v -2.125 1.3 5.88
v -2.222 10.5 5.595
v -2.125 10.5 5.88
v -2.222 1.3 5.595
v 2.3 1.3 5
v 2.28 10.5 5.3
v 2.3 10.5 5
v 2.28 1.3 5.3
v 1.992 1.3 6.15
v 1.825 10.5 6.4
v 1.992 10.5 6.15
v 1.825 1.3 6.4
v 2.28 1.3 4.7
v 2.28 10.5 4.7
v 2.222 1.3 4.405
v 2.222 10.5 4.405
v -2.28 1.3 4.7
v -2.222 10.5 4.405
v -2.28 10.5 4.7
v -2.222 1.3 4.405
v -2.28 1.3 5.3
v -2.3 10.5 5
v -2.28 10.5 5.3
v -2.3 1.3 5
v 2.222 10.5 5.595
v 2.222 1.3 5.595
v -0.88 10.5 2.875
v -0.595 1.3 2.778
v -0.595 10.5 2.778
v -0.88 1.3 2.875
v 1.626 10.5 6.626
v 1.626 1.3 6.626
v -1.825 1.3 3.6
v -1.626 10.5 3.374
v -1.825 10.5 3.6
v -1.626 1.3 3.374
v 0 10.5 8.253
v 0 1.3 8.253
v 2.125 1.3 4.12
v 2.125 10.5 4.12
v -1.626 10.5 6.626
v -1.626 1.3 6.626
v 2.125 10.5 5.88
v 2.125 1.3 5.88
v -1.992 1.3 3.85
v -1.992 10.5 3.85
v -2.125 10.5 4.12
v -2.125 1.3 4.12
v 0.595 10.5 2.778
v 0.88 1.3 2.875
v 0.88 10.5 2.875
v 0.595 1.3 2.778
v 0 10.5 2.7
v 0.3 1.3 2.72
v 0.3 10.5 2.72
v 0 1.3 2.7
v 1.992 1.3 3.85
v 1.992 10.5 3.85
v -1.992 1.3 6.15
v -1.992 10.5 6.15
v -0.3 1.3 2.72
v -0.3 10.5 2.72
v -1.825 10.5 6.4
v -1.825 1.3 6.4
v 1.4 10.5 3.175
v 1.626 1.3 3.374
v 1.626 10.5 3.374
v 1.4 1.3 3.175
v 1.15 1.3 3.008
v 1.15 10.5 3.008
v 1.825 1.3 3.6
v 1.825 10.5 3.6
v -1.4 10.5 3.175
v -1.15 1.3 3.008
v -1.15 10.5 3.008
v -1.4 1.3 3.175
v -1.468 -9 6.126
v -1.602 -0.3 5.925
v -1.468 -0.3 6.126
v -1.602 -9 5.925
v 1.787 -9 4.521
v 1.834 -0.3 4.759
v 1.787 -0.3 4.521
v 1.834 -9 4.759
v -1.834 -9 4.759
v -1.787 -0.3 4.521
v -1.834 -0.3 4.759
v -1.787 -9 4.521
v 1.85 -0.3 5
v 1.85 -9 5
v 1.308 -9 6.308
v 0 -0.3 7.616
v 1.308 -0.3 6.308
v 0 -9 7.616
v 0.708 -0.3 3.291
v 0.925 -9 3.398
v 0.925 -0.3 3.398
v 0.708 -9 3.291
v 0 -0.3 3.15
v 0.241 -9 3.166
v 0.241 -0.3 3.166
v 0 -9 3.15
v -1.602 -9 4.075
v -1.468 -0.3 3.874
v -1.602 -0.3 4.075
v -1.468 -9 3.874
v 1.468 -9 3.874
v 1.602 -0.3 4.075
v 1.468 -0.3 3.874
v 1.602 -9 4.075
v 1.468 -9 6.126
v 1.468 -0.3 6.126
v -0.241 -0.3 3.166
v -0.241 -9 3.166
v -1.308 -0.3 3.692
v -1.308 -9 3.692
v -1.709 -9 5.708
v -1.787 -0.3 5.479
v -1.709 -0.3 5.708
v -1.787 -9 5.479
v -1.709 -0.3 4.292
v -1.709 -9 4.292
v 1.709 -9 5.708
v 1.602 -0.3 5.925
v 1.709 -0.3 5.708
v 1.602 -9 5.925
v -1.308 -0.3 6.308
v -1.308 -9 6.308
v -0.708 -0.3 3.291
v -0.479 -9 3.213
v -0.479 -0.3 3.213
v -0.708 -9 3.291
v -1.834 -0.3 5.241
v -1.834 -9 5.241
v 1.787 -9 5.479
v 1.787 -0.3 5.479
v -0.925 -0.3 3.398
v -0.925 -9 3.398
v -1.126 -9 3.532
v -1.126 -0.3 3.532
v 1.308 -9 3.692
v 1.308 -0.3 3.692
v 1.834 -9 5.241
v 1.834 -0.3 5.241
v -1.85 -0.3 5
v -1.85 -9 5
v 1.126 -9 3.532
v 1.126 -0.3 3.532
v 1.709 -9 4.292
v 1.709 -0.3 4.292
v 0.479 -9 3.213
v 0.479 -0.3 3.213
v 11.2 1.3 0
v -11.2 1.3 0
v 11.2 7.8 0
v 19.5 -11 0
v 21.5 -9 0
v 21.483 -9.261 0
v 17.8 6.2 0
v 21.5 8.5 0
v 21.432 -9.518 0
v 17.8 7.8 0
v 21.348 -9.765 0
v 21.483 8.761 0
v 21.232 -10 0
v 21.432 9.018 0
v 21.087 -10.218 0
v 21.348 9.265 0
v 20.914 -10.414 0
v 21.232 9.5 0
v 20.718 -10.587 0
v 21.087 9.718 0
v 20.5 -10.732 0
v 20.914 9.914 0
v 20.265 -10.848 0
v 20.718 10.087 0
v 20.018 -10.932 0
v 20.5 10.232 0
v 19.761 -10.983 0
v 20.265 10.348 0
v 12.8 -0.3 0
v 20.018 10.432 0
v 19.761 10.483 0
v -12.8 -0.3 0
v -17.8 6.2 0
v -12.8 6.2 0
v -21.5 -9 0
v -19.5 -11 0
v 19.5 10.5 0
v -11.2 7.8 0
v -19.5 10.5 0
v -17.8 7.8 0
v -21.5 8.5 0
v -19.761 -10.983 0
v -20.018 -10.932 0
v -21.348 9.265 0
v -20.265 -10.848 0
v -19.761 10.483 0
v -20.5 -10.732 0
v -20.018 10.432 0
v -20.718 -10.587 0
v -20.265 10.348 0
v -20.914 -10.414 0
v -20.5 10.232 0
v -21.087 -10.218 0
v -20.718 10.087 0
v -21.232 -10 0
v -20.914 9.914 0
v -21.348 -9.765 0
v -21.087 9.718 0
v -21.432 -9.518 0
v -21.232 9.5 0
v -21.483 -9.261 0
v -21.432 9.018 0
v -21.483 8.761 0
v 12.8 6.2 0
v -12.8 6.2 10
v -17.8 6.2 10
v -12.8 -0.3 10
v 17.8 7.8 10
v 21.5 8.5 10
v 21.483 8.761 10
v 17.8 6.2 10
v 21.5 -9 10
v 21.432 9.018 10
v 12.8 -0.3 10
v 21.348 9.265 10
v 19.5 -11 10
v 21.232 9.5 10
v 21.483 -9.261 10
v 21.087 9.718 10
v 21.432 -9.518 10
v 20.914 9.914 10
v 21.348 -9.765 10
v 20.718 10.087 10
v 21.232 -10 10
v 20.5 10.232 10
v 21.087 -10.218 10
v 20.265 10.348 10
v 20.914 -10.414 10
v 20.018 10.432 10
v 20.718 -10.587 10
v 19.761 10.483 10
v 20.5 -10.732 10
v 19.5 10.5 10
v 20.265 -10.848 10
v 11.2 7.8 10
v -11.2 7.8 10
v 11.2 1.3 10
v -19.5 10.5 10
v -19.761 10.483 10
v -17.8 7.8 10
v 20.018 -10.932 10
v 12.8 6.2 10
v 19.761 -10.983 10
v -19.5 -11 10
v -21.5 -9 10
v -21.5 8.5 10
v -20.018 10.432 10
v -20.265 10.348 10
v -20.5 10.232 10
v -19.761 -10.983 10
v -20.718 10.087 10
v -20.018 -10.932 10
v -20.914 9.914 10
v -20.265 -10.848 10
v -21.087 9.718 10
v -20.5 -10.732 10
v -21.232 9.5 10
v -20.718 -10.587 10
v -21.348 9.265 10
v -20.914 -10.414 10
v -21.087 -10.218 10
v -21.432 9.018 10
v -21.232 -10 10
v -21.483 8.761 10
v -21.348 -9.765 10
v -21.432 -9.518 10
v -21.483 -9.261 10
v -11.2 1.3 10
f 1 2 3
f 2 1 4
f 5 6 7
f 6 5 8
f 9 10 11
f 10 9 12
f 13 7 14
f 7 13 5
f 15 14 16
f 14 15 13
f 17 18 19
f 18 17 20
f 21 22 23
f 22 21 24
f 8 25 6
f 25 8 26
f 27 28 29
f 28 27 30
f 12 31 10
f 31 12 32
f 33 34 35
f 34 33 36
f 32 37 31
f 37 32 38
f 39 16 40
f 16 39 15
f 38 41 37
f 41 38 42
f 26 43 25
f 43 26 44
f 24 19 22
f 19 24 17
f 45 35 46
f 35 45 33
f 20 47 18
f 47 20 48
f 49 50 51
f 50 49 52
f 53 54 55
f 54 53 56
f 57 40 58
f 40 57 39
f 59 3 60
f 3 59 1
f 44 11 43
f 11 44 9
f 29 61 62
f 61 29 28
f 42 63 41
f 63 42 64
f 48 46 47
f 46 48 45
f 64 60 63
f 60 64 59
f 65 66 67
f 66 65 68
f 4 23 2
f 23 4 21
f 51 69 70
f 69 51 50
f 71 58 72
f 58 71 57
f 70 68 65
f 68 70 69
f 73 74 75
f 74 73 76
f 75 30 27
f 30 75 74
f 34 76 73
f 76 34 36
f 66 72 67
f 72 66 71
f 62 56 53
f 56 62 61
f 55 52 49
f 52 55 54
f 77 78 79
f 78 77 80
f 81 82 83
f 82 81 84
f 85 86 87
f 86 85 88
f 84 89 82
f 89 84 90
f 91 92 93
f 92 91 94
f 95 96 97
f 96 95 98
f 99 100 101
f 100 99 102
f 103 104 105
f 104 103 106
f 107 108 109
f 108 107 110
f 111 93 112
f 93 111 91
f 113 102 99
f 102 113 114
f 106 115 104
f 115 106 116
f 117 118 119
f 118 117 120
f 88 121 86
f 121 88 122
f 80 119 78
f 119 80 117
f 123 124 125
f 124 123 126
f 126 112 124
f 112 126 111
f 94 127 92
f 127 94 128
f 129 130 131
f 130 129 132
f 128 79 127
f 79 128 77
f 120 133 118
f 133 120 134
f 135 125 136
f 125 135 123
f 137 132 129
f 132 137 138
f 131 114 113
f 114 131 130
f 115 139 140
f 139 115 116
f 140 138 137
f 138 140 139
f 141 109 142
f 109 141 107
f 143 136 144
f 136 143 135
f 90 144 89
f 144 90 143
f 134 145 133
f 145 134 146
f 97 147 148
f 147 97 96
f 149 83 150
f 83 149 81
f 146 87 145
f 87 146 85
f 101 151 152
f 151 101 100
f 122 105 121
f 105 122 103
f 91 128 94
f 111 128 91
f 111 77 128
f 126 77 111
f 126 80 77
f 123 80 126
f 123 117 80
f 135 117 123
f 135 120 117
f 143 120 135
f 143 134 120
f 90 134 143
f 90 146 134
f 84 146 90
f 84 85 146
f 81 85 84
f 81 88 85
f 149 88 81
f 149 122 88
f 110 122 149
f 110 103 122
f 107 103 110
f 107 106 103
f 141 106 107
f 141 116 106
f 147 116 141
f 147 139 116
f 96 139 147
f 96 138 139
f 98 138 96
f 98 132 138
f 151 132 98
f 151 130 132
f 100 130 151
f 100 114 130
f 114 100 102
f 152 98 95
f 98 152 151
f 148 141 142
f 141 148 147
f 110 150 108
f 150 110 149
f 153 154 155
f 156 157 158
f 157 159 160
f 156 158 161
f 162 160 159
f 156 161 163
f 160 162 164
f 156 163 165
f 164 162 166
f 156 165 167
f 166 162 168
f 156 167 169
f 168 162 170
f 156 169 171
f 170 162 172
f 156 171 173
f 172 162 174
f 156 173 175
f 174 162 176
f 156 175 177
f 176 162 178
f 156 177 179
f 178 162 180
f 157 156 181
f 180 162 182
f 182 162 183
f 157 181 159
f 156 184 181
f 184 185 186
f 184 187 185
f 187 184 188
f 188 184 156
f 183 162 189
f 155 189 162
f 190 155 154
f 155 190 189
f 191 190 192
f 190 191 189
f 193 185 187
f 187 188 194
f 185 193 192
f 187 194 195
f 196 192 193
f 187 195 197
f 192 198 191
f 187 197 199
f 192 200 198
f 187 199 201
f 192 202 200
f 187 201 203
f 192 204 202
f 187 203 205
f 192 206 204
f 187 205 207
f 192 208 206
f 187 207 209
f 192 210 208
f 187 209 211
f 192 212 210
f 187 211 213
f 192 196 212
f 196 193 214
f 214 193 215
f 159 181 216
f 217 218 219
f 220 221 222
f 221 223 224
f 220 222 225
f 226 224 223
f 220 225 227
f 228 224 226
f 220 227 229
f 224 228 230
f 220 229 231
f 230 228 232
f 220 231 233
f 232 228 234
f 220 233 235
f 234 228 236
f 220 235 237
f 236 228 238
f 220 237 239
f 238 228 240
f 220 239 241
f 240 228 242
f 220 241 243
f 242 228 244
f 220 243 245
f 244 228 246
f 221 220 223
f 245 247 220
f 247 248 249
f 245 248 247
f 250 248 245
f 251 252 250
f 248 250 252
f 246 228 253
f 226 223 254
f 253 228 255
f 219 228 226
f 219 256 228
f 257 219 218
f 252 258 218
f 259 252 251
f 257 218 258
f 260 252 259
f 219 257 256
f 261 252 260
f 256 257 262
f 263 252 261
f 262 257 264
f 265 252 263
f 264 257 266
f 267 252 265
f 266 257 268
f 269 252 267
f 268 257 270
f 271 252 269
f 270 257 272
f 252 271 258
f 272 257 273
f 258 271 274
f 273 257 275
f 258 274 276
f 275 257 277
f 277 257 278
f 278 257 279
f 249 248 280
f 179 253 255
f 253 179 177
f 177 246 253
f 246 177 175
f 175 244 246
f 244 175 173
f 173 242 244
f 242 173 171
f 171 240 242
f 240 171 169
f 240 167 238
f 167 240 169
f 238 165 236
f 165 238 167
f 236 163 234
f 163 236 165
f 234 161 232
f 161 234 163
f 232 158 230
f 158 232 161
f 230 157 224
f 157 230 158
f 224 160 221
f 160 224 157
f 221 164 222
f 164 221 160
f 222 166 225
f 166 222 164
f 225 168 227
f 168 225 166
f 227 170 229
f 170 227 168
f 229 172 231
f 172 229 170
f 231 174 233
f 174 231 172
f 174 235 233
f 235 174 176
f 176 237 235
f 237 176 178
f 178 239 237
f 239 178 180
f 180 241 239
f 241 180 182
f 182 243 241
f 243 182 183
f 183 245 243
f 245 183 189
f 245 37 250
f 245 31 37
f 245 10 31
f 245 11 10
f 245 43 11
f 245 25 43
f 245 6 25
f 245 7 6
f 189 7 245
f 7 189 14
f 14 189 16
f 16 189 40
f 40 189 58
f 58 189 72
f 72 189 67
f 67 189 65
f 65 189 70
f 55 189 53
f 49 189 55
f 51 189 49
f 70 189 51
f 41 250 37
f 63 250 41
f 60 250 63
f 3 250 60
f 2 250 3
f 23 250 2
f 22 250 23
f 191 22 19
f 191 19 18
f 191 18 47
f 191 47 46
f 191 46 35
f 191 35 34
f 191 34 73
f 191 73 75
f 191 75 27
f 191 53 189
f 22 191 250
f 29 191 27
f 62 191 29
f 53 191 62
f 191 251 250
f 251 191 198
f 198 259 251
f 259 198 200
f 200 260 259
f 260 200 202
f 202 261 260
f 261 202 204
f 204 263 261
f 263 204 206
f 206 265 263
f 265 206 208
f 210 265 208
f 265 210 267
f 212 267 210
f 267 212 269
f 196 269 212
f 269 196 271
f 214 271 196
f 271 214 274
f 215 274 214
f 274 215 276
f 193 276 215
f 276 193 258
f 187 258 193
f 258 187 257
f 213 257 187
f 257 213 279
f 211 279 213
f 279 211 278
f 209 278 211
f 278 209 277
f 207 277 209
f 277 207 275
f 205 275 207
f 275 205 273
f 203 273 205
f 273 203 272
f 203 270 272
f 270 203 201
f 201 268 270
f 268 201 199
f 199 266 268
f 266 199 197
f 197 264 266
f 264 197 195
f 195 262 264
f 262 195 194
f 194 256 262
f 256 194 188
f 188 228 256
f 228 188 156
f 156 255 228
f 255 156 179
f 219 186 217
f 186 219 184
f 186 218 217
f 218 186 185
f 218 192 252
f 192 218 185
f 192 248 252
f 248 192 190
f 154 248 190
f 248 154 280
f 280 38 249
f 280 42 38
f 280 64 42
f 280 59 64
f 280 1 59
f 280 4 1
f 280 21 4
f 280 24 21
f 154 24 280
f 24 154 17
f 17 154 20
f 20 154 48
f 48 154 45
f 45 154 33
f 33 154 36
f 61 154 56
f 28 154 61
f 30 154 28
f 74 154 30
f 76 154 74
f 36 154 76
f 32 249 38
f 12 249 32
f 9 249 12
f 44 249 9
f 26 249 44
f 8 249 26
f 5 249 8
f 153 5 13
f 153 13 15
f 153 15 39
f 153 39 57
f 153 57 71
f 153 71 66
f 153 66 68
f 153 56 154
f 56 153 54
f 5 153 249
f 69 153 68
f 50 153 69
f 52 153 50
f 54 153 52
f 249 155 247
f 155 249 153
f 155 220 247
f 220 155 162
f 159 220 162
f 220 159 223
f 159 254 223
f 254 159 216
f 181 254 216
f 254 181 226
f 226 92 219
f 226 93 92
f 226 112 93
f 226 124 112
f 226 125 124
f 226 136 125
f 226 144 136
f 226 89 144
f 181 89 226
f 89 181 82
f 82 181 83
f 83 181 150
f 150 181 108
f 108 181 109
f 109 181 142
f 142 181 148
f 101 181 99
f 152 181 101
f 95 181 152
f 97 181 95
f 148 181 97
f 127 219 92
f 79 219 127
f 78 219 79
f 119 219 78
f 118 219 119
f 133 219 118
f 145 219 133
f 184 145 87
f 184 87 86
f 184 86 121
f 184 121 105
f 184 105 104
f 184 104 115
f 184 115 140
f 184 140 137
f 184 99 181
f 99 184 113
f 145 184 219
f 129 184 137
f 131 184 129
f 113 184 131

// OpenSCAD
// file: model.scad
// DIN-rail bench stand: one end bracket of a pair, holding four TS35 rails.
// Two rails cross the sloped front face, one above the other; the third lies flat on the foot, in front of them;
// the fourth lies flat inside the frame at the back, under the face, for AC gear: a small PSU, terminals, relays.
//
// After Szmalu's "DIN Rail Stand KIT" (Thingiverse 3609072; nothing of its mesh is used): each rail passes through
// the bracket in a slot of its own cross-section, held between the slot's flat faces, and one M4 screw through
// the slot's cover and the rail's base pins it lengthwise. The plate is thick across the rail and the bars are
// ladders, two thin strips with a slot between, as the original's foot is.
//
// The profile is drawn in 2D with x toward the front of the desk and y up, then extruded bracket_t:
// print flat, as modelled; view="assembly" stands two brackets up with rails and module envelopes;
// view="gauge" is one rail block, thin, to check the slot and screw fit before the bracket prints.

/* [View] */
view = "part";            // "part" (print), "assembly" or "gauge"

/* [Frame] */
a = 60;                   // sloped face, degrees above the desk; modules lean back 90 - a
bar_w = 11;               // width of every bar in the profile
strip = 3;                // each of a ladder bar's two strips; the slot between is bar_w - 2 strip
rung_pitch = 70;          // a rung across the ladder slot at least this often
bracket_t = 20;           // thickness of the plate (print height), across the rail

/* [Rails] */
s1 = 70;                  // tier 1 rail centre, along the face from its foot
pitch = 125;              // tier 2 sits this far above tier 1, along the face
face_over = 15;           // face runs this far past the top module's envelope
flat_x = 280;             // flat rail centre, from the back of the stand
back_x = 60;              // back (AC) rail centre, from the back of the stand
face_shift = 35;          // face starts this far forward of the back post, to make room for the back rail

/* [Rail slot] TS35 passes through, held between the slot's faces */
rail_clr = 0.3;           // slot clearance each side of the 1 mm rail sheet; guess, gauge it
block_wall = 4;           // block beyond each rail lip
cover = 3;                // block over the rail's lips, outward

/* [Fixing] M4 x 16 screw through the cover, the rail's base slot, into a pilot below */
clear_d = 4.6;            // through the cover and the plastic in the rail's channel; guess
pilot_d = 3.7;            // guess; printed holes run small, gauge before trusting it
pilot_depth = 9;          // below the rail's base

/* [Module envelope, for the assembly view and the clearance test] */
mod_h = 90;               // DIN module height, across the rail (standard 90)
mod_d = 70;               // module depth out from the rail base (guess: PSU 55-60, meters ~65)
back_mod_d = 65;          // the back rail's modules: small PSU, terminals, relays (guess)
rail_len = 300;           // rail length in the assembly view

/* [Gauge] */
gauge_t = 10;             // gauge print height

/* [Hidden] */
$fn = 48;
e = 0.01;
u = [-cos(a), sin(a)];            // up the face
n = [sin(a), cos(a)];             // out of the face (toward the user)
face_len = s1 + pitch + mod_h / 2 + face_over;
foot0 = [bar_w / 2 + face_shift + face_len * cos(a), bar_w / 2];   // face centreline at its foot
top = foot0 + face_len * u;                           // joined back to the post by a top bar
foot_len = flat_x + mod_h / 2 + 10;
post_top = [bar_w / 2, top[1]];
post_foot = [bar_w / 2, bar_w / 2];
foot_end = [foot_len, bar_w / 2];

function edge(s) = foot0 + s * u + (bar_w / 2) * n;  // rail base on the face's outer edge

// rail seats: base point and outward direction
seats = [[edge(s1), n], [edge(s1 + pitch), n], [[flat_x, bar_w], [0, 1]], [[back_x, bar_w], [0, 1]]];
strut_from = [bar_w / 2, edge(s1 + pitch)[1] - bar_w * n[1]];
strut_to = edge(s1 + pitch) - bar_w * n;

module bar(p, q, w = bar_w) hull() { translate(p) circle(d = w); translate(q) circle(d = w); }
module teardrop(d) hull() { circle(d = d); rotate(45) square(d / 2); }   // point +Y (print up after rotation)

// local frame at a seat: +y out of the rail (toward the module), +x across the rail's width
module at(c, o) translate(c) rotate(atan2(o[1], o[0]) - 90) children();

module rail2d() polygon([[-17.5, 7.5], [-17.5, 6.5], [-12.5, 6.5], [-12.5, 0], [12.5, 0], [12.5, 6.5], [17.5, 6.5],
                         [17.5, 7.5], [11.5, 7.5], [11.5, 1], [-11.5, 1], [-11.5, 7.5]]);
module block2d() offset(r = 2) offset(delta = -2)
    translate([-17.5 - block_wall, -bar_w]) square([35 + 2 * block_wall, bar_w + 7.5 + cover]);

module ladder_slot(p, q) {
    d = q - p; L = norm(d); k = ceil((L - 2 * bar_w) / rung_pitch);
    difference() {
        bar(p + bar_w * d / L, q - bar_w * d / L, bar_w - 2 * strip);
        for (i = [1 : k - 1]) translate(p + (bar_w + i * (L - 2 * bar_w) / k) * d / L)
            rotate(atan2(d[1], d[0])) square([strip, bar_w], center = true);
    }
}

module profile() {
    difference() {
        union() {
            bar(post_foot, foot_end);            // foot, on the desk
            bar(post_foot, post_top);            // back post
            bar(post_top, top);                  // top bar, post to face
            bar(foot0, top);                     // sloped face
            bar(strut_from, strut_to, 2 * strip);   // strut, back post to tier 2 block
            for (s = seats) at(s[0], s[1]) block2d();
        }
        difference() {
            union() {
                ladder_slot(post_foot, foot_end);
                ladder_slot(post_foot, post_top);
                ladder_slot(post_top, top);
                ladder_slot(foot0, top);
            }
            for (s = seats) at(s[0], s[1]) offset(delta = strip) block2d();
            for (p = [foot0, strut_from]) translate(p) circle(d = bar_w + 2 * strip);
        }
        for (s = seats) at(s[0], s[1]) offset(delta = rail_clr) rail2d();
    }
}

// the screw hole at a seat: clearance from the block's outer face to the rail base, then a pilot below.
// Horizontal in print, so a teardrop pointing +Z.
module screw_hole(c, o, z) {
    th = atan2(o[1], o[0]);
    translate([c[0], c[1], z]) rotate([0, 0, th]) rotate([0, 90, 0]) rotate([0, 0, 90]) {
        translate([0, 0, -e]) linear_extrude(7.5 + cover + 1) teardrop(clear_d);
        translate([0, 0, -pilot_depth]) linear_extrude(pilot_depth + e) teardrop(pilot_d);
    }
}

module bracket() {
    difference() {
        linear_extrude(bracket_t) profile();
        for (s = seats) screw_hole(s[0], s[1], bracket_t / 2);
    }
}

// one rail block, as on the face, thin: checks the slot fit and the screw before the bracket prints
module gauge() {
    difference() {
        linear_extrude(gauge_t) difference() { block2d(); offset(delta = rail_clr) rail2d(); }
        screw_hole([0, 0], [0, 1], gauge_t / 2);
    }
}

// ---- assembly view only ----
module ts35(len) rotate([90, 0, 0]) linear_extrude(len, center = true) rail2d();   // base on z = 0, along Y
module envelope(len, d = mod_d) translate([-mod_h / 2, -len / 2, 7.5]) cube([mod_h, len, d - 7.5]);

// place children at 2D point c, tilted so local +Z is the outward direction o; rail along Y
module at_seat(c, o) translate([c[0], 0, c[1]]) rotate([0, 90 - atan2(o[1], o[0]), 0]) children();

module assembly() {
    span = rail_len - 2 * 15;
    for (y = [-span / 2 + bracket_t, span / 2]) translate([0, y, 0]) rotate([90, 0, 0]) color("SteelBlue") bracket();
    for (i = [0 : 3]) at_seat(seats[i][0], seats[i][1]) {
        color("Silver") ts35(rail_len);
        color(i == 3 ? "Red" : "Orange", 0.35) envelope(span - 2 * bracket_t, i == 3 ? back_mod_d : mod_d);
    }
}

if (view == "assembly") assembly(); else if (view == "gauge") gauge(); else bracket();
// main file
// Fit-check gauge, hand-written: one rail block as on the face, 10 tall, with its TS35 slot and M4 screw hole.
// Slide a rail offcut through it and drive the screw before printing the brackets; rail_clr and pilot_d live in model.scad.
use <model.scad>
gauge();
